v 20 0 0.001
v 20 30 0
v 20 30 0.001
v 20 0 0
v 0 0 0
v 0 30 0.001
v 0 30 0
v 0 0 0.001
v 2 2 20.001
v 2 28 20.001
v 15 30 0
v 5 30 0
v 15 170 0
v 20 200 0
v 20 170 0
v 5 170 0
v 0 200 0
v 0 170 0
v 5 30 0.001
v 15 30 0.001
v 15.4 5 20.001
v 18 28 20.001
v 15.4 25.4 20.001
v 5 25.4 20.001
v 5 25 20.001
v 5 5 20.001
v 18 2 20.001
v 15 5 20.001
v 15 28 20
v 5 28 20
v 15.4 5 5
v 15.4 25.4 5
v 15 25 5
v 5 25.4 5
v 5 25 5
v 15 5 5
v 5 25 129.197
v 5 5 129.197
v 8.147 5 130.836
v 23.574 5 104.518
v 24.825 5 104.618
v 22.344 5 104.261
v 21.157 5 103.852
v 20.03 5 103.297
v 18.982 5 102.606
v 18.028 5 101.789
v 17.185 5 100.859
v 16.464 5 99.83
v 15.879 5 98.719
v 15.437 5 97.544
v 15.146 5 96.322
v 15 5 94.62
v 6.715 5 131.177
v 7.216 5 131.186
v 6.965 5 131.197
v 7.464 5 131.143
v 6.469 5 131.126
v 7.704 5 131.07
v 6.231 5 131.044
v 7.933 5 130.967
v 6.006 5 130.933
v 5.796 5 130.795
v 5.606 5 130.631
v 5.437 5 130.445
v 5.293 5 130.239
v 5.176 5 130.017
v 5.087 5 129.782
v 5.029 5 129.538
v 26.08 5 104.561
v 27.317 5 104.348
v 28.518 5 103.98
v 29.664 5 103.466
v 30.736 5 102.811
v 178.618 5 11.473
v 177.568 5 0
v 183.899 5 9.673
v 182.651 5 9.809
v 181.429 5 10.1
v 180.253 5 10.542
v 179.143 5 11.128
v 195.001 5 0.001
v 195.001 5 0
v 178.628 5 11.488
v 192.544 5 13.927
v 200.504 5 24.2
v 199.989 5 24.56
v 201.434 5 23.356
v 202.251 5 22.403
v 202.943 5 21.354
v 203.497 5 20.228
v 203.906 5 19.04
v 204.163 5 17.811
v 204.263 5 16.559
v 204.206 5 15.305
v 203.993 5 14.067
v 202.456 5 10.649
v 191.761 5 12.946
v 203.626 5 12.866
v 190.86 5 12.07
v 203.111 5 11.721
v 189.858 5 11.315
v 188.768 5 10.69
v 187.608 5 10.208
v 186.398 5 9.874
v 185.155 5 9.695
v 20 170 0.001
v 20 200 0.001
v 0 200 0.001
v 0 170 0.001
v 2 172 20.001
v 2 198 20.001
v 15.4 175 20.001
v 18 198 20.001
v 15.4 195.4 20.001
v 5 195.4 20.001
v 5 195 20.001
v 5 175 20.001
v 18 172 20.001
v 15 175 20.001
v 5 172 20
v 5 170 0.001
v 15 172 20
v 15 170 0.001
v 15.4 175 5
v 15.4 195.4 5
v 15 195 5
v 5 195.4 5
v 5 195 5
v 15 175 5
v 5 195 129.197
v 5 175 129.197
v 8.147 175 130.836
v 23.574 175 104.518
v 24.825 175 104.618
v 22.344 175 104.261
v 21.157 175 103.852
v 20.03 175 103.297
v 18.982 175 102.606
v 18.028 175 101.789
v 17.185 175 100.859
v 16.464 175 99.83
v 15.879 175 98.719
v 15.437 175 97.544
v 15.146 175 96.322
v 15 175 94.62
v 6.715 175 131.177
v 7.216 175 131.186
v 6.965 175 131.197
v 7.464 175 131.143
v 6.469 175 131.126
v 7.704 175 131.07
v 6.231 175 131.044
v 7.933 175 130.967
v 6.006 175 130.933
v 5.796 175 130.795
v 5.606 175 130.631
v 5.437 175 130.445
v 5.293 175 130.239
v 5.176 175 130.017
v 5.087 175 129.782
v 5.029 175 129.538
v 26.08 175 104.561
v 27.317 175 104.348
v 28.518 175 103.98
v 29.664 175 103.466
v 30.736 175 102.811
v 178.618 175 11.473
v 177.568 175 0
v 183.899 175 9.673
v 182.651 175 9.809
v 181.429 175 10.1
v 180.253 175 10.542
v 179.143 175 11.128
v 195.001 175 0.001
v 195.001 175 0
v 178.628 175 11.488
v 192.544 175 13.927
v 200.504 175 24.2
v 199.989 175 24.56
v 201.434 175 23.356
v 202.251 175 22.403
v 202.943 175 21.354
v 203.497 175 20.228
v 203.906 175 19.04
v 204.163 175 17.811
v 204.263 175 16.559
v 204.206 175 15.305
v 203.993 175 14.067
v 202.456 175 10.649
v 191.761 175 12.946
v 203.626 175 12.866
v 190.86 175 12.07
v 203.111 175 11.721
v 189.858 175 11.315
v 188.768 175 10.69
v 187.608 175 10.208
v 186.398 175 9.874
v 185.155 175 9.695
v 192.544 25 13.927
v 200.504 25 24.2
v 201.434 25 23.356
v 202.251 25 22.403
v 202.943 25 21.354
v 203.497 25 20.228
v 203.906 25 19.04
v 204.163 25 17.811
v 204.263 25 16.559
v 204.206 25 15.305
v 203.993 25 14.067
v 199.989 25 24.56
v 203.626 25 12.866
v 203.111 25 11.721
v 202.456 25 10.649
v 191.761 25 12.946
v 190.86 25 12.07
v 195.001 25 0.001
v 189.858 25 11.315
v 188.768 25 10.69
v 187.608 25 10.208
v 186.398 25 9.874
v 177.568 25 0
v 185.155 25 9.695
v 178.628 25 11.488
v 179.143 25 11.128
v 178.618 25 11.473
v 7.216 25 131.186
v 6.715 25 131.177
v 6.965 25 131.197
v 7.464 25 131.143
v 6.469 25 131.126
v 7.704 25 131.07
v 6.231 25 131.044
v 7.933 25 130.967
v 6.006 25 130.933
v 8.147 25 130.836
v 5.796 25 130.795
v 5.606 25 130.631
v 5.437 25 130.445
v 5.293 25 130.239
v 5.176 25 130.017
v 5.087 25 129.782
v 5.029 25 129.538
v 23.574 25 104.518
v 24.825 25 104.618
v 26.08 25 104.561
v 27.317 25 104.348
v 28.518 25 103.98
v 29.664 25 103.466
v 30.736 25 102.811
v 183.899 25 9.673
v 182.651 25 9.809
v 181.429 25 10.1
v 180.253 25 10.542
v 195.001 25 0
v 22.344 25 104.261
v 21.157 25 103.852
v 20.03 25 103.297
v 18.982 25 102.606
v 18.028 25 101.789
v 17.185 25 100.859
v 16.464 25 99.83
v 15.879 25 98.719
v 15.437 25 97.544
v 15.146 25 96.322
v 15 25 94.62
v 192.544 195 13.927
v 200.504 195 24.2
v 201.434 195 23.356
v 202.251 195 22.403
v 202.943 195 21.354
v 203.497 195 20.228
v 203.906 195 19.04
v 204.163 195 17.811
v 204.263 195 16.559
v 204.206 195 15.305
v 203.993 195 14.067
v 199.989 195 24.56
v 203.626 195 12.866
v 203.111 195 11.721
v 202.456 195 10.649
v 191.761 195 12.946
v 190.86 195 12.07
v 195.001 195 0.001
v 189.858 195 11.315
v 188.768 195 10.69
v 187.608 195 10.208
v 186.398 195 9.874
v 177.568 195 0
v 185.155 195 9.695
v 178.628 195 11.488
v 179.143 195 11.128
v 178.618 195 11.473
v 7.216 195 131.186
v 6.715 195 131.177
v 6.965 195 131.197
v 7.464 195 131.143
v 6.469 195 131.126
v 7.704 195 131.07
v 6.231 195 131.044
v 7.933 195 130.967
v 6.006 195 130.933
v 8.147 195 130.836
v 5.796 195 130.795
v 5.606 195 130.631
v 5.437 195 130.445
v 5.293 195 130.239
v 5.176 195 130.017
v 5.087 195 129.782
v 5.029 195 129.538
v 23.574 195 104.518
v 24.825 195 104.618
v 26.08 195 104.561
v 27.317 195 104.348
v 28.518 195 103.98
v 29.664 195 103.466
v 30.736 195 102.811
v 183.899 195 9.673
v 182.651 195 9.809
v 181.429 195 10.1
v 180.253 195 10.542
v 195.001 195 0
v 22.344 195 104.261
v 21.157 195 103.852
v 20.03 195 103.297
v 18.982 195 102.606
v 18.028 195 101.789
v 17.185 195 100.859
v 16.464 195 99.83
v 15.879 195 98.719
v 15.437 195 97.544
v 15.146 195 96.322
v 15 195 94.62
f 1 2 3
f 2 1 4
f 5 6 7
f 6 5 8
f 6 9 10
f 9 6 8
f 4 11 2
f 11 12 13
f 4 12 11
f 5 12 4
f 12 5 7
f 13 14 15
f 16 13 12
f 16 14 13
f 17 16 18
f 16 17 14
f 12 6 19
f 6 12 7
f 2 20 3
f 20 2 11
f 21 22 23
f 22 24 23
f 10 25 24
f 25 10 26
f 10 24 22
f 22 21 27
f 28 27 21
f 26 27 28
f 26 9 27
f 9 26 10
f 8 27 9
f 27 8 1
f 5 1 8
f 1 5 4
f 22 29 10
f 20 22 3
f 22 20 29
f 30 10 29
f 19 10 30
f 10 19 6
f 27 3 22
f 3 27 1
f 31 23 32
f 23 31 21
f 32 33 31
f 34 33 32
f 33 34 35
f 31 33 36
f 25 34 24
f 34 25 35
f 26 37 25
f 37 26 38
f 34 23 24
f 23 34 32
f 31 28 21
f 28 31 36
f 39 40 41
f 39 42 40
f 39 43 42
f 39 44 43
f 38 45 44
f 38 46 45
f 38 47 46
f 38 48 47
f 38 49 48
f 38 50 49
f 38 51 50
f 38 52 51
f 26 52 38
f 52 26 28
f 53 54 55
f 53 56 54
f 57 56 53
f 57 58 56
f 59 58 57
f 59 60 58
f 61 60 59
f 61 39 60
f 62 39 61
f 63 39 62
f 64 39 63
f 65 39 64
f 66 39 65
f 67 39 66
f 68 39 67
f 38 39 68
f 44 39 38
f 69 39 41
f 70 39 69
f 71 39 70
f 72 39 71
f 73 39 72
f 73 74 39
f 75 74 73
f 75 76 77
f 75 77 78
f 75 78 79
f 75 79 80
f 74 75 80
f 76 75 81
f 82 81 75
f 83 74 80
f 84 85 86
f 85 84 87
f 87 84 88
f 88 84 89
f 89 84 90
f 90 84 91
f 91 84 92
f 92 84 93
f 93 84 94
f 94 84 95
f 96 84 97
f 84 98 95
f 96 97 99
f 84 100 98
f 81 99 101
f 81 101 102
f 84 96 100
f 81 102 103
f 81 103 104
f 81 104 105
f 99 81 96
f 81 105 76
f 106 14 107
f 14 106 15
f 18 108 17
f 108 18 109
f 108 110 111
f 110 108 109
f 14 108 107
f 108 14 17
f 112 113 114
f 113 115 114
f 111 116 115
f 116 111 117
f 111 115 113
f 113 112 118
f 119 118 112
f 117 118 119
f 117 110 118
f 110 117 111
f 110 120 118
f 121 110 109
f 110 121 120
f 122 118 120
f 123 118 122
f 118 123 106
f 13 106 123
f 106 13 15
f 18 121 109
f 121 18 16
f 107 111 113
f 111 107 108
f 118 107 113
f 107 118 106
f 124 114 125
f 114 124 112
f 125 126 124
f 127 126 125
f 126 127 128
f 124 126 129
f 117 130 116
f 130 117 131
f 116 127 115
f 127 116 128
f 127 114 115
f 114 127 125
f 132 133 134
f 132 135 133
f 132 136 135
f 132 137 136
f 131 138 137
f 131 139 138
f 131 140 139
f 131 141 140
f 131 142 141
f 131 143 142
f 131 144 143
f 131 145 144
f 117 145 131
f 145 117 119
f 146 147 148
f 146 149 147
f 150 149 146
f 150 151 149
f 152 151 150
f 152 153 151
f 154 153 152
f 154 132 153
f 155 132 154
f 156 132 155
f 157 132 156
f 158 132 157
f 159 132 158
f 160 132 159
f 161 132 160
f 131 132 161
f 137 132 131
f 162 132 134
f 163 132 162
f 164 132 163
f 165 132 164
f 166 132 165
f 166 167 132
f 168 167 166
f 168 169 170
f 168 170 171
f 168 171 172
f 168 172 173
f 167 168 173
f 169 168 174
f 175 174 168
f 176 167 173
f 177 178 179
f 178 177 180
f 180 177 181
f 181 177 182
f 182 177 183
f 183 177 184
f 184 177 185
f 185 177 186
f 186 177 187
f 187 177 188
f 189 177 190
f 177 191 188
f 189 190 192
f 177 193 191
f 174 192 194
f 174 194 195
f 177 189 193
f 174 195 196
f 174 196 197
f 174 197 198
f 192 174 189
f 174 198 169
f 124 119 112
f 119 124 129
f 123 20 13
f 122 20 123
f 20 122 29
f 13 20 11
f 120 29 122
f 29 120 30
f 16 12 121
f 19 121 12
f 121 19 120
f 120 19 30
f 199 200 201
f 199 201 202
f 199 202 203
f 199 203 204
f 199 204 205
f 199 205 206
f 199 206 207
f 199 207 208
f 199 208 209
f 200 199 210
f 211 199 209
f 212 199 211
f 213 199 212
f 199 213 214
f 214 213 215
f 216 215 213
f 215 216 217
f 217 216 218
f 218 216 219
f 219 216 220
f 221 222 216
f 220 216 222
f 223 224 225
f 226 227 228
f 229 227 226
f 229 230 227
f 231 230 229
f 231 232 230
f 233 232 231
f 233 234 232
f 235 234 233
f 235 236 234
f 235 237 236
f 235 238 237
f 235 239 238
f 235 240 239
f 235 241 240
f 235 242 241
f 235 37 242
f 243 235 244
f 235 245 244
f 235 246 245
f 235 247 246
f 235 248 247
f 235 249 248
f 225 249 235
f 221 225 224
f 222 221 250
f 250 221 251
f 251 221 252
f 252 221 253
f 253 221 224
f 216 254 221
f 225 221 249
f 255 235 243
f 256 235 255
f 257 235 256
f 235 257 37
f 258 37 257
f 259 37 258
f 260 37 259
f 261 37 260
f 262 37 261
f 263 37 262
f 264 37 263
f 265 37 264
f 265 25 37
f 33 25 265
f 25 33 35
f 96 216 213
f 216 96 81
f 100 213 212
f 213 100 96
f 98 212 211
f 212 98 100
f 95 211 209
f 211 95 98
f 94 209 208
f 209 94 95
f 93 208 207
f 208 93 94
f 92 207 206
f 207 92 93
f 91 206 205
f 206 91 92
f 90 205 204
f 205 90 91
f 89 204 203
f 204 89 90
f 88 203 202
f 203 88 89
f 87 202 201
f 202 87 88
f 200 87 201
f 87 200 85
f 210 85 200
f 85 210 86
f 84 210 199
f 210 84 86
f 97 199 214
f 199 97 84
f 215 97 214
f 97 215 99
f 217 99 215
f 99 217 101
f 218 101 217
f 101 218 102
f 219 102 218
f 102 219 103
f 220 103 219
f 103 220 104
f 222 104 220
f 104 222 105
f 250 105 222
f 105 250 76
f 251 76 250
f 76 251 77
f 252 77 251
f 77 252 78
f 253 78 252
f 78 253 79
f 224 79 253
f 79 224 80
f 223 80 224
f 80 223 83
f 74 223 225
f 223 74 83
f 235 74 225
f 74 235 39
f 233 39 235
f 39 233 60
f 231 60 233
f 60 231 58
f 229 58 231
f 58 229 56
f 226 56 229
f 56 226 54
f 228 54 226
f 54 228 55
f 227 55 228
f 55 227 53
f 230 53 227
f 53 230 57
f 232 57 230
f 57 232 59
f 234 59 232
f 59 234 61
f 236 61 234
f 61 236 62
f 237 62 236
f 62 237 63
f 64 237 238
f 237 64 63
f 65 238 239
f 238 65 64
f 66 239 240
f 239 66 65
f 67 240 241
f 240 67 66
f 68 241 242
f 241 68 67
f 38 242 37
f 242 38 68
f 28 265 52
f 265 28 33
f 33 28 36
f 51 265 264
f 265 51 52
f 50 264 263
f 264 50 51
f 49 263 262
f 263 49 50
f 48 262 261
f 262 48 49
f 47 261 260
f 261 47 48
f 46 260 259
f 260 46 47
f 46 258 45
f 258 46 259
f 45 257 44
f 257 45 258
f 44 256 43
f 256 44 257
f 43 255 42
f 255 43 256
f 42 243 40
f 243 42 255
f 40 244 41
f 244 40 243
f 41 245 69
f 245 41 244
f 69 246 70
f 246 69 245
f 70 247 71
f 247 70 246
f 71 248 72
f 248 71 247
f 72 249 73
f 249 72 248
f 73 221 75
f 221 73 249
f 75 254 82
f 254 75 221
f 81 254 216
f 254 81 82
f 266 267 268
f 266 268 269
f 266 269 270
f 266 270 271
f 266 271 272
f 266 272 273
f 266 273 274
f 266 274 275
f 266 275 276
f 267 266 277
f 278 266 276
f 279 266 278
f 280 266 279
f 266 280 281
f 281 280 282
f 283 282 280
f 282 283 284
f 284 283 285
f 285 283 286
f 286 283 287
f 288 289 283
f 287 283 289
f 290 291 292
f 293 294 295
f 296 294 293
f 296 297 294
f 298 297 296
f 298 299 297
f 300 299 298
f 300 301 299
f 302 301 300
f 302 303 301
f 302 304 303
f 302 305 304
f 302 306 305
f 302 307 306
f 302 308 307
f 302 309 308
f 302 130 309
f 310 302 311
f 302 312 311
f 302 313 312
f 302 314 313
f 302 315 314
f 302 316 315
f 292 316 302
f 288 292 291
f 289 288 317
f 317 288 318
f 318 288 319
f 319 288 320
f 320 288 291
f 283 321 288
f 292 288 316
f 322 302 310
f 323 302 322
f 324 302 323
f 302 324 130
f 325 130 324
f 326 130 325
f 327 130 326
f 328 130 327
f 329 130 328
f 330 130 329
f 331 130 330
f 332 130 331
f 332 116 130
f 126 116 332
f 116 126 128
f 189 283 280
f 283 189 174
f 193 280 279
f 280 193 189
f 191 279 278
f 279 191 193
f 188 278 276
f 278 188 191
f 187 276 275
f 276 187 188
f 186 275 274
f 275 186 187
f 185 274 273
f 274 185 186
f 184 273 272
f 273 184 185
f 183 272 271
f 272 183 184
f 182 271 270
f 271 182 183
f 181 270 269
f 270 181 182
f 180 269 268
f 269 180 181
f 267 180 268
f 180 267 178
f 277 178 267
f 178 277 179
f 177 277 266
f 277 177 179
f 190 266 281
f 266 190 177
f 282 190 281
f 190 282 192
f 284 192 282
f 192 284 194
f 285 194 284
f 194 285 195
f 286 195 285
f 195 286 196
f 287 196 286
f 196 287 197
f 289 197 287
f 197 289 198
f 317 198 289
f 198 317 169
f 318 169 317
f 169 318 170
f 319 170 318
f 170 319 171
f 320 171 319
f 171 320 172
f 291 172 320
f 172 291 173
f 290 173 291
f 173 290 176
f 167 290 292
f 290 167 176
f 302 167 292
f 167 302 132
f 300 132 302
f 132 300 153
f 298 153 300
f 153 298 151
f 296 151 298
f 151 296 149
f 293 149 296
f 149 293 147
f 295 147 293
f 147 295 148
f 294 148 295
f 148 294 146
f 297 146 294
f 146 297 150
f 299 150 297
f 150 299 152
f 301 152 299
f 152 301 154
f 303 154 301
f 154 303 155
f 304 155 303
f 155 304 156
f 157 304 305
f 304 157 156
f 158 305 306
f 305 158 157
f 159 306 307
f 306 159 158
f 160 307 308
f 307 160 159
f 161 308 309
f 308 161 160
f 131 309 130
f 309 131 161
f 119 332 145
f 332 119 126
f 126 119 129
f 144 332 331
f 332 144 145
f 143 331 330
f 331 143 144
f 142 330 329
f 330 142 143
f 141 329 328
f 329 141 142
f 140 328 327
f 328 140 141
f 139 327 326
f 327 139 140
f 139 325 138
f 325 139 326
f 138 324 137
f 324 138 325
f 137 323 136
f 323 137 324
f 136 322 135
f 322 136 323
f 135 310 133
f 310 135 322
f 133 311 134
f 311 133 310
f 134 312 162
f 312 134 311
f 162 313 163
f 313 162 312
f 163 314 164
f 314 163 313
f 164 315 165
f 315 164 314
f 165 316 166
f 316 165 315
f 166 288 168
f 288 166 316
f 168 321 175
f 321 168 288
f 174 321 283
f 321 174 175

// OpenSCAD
// A customizable laptop stand 


// Module naming convenitions:
//  - xxx_shape is a 2D shape 
//  - xxx_part is a 3D part
//  - the stand is made of one `lower_rail_part` and two `upper_rail_part`s
//  - the upper rail's front section, that stops the laptop from falling is called the `tip`
//  - the lower rail's section for inserting the upper rail is called `shoe`  


//Input parameters:

ANGLE=35; // the angle
LENGTH = 190; //the total length of the base
WIDTH = 200; //the total width of the base

//side of the triangle calculated from the other side and an angle
HEIGHT = sqrt((LENGTH*LENGTH*sin(ANGLE)*sin(ANGLE))/(1-sin(ANGLE)*sin(ANGLE)));
echo(HEIGHT);

//Parameters to tweak:

//the size of the rails
THICK1 = 10;
THICK2 = 20;

//offsets for the socket
SHOE_OFFS1 = 5;
SHOE_OFFS2 = 3;
SHOE_SPACER = 0.2;

//extra height for the tip section
TIP_OFFS = 3; 


module upper_rail_shape() {
    
    difference(){
        hull(){
            offset(THICK1/5, $fn=50)
            offset(-THICK1/5)
                polygon([[0,0], [0,HEIGHT], [LENGTH,0]]);
            
            square([0.001,0.001]);
            translate([LENGTH,0])
                square([0.001,0.001]);
        }
        
        //the side of the triangle having height=THICK1
        OFFS = THICK1/sin(90-ANGLE);
        
        hull(){    
            offset(THICK1,, $fn=50)
            offset(-2*THICK1)
            polygon([[0,0], [0,HEIGHT], [LENGTH, 0]]);

            translate([THICK1,-OFFS])
            square([0.001,0.001]);
            translate([LENGTH,-OFFS])
            square([0.001,0.001]);
        }
        //5 mm shorter for the shoe 
        square([THICK1,5]);
    }
    
    translate([LENGTH,0])
    rotate(-ANGLE)
    translate([-THICK1,0])
    tip_shape();
}


module tip_shape(){
    union(){
        //the lower rounding
        translate([-THICK1,0])
        difference(){
            square([THICK1, THICK1]);
            translate([0, THICK1]) circle(r=THICK1, $fn=50);
        }

        // the upper rounding
        translate([0,THICK1+TIP_OFFS])
        intersection(){
            square([THICK1, THICK1]);
            circle(r=THICK1, $fn=50);
        }
        
        square([THICK1,THICK1+TIP_OFFS]);
    }
}


module upper_rail_part(){
    linear_extrude(height=THICK2)
        upper_rail_shape();
}


module shoe_part(){
    translate([SHOE_OFFS1,SHOE_OFFS1])
    difference(){
        hull(){
           translate([-SHOE_OFFS1,-SHOE_OFFS1,0])
           scale([(THICK1+2*SHOE_OFFS1)/THICK1, (THICK2+2*SHOE_OFFS1)/THICK2,1])
           cube([THICK1,THICK2,0.001]);

           translate([-SHOE_OFFS2,-SHOE_OFFS2, THICK2])
           scale([(THICK1+2*SHOE_OFFS2)/THICK1, (THICK2+2*SHOE_OFFS2)/THICK2,1])
           cube([THICK1,THICK2,0.001]);
       }
       
       //the cutout + 0.2 spacer
       translate([0,0,5])
       scale([(THICK1+2*SHOE_SPACER)/THICK1, (THICK2+2*SHOE_SPACER)/THICK2,1])
       cube([THICK1,THICK2,THICK2]);
    }
}

module lower_rail_part(){
    
    SHOE_WIDTH = THICK2+2*SHOE_OFFS1;
    
    shoe_part();    
    translate([0, WIDTH-SHOE_WIDTH])
        shoe_part();
    
    //the cross rail
    translate([SHOE_OFFS1, SHOE_WIDTH-SHOE_OFFS2, 0])
    cube([THICK1, WIDTH - 2* (SHOE_WIDTH - SHOE_OFFS2), THICK2]);
}

module demo() {
    
    lower_rail_part();
    
    translate([SHOE_OFFS1,THICK2+SHOE_OFFS1,0])
    rotate([90,0,0])
    upper_rail_part();
    
    translate([SHOE_OFFS1,WIDTH-SHOE_OFFS1,0])
    rotate([90,0,0])
    upper_rail_part();
}


//uncomment here to print the parts
//upper_rail_part();
//lower_rail_part();

demo();
